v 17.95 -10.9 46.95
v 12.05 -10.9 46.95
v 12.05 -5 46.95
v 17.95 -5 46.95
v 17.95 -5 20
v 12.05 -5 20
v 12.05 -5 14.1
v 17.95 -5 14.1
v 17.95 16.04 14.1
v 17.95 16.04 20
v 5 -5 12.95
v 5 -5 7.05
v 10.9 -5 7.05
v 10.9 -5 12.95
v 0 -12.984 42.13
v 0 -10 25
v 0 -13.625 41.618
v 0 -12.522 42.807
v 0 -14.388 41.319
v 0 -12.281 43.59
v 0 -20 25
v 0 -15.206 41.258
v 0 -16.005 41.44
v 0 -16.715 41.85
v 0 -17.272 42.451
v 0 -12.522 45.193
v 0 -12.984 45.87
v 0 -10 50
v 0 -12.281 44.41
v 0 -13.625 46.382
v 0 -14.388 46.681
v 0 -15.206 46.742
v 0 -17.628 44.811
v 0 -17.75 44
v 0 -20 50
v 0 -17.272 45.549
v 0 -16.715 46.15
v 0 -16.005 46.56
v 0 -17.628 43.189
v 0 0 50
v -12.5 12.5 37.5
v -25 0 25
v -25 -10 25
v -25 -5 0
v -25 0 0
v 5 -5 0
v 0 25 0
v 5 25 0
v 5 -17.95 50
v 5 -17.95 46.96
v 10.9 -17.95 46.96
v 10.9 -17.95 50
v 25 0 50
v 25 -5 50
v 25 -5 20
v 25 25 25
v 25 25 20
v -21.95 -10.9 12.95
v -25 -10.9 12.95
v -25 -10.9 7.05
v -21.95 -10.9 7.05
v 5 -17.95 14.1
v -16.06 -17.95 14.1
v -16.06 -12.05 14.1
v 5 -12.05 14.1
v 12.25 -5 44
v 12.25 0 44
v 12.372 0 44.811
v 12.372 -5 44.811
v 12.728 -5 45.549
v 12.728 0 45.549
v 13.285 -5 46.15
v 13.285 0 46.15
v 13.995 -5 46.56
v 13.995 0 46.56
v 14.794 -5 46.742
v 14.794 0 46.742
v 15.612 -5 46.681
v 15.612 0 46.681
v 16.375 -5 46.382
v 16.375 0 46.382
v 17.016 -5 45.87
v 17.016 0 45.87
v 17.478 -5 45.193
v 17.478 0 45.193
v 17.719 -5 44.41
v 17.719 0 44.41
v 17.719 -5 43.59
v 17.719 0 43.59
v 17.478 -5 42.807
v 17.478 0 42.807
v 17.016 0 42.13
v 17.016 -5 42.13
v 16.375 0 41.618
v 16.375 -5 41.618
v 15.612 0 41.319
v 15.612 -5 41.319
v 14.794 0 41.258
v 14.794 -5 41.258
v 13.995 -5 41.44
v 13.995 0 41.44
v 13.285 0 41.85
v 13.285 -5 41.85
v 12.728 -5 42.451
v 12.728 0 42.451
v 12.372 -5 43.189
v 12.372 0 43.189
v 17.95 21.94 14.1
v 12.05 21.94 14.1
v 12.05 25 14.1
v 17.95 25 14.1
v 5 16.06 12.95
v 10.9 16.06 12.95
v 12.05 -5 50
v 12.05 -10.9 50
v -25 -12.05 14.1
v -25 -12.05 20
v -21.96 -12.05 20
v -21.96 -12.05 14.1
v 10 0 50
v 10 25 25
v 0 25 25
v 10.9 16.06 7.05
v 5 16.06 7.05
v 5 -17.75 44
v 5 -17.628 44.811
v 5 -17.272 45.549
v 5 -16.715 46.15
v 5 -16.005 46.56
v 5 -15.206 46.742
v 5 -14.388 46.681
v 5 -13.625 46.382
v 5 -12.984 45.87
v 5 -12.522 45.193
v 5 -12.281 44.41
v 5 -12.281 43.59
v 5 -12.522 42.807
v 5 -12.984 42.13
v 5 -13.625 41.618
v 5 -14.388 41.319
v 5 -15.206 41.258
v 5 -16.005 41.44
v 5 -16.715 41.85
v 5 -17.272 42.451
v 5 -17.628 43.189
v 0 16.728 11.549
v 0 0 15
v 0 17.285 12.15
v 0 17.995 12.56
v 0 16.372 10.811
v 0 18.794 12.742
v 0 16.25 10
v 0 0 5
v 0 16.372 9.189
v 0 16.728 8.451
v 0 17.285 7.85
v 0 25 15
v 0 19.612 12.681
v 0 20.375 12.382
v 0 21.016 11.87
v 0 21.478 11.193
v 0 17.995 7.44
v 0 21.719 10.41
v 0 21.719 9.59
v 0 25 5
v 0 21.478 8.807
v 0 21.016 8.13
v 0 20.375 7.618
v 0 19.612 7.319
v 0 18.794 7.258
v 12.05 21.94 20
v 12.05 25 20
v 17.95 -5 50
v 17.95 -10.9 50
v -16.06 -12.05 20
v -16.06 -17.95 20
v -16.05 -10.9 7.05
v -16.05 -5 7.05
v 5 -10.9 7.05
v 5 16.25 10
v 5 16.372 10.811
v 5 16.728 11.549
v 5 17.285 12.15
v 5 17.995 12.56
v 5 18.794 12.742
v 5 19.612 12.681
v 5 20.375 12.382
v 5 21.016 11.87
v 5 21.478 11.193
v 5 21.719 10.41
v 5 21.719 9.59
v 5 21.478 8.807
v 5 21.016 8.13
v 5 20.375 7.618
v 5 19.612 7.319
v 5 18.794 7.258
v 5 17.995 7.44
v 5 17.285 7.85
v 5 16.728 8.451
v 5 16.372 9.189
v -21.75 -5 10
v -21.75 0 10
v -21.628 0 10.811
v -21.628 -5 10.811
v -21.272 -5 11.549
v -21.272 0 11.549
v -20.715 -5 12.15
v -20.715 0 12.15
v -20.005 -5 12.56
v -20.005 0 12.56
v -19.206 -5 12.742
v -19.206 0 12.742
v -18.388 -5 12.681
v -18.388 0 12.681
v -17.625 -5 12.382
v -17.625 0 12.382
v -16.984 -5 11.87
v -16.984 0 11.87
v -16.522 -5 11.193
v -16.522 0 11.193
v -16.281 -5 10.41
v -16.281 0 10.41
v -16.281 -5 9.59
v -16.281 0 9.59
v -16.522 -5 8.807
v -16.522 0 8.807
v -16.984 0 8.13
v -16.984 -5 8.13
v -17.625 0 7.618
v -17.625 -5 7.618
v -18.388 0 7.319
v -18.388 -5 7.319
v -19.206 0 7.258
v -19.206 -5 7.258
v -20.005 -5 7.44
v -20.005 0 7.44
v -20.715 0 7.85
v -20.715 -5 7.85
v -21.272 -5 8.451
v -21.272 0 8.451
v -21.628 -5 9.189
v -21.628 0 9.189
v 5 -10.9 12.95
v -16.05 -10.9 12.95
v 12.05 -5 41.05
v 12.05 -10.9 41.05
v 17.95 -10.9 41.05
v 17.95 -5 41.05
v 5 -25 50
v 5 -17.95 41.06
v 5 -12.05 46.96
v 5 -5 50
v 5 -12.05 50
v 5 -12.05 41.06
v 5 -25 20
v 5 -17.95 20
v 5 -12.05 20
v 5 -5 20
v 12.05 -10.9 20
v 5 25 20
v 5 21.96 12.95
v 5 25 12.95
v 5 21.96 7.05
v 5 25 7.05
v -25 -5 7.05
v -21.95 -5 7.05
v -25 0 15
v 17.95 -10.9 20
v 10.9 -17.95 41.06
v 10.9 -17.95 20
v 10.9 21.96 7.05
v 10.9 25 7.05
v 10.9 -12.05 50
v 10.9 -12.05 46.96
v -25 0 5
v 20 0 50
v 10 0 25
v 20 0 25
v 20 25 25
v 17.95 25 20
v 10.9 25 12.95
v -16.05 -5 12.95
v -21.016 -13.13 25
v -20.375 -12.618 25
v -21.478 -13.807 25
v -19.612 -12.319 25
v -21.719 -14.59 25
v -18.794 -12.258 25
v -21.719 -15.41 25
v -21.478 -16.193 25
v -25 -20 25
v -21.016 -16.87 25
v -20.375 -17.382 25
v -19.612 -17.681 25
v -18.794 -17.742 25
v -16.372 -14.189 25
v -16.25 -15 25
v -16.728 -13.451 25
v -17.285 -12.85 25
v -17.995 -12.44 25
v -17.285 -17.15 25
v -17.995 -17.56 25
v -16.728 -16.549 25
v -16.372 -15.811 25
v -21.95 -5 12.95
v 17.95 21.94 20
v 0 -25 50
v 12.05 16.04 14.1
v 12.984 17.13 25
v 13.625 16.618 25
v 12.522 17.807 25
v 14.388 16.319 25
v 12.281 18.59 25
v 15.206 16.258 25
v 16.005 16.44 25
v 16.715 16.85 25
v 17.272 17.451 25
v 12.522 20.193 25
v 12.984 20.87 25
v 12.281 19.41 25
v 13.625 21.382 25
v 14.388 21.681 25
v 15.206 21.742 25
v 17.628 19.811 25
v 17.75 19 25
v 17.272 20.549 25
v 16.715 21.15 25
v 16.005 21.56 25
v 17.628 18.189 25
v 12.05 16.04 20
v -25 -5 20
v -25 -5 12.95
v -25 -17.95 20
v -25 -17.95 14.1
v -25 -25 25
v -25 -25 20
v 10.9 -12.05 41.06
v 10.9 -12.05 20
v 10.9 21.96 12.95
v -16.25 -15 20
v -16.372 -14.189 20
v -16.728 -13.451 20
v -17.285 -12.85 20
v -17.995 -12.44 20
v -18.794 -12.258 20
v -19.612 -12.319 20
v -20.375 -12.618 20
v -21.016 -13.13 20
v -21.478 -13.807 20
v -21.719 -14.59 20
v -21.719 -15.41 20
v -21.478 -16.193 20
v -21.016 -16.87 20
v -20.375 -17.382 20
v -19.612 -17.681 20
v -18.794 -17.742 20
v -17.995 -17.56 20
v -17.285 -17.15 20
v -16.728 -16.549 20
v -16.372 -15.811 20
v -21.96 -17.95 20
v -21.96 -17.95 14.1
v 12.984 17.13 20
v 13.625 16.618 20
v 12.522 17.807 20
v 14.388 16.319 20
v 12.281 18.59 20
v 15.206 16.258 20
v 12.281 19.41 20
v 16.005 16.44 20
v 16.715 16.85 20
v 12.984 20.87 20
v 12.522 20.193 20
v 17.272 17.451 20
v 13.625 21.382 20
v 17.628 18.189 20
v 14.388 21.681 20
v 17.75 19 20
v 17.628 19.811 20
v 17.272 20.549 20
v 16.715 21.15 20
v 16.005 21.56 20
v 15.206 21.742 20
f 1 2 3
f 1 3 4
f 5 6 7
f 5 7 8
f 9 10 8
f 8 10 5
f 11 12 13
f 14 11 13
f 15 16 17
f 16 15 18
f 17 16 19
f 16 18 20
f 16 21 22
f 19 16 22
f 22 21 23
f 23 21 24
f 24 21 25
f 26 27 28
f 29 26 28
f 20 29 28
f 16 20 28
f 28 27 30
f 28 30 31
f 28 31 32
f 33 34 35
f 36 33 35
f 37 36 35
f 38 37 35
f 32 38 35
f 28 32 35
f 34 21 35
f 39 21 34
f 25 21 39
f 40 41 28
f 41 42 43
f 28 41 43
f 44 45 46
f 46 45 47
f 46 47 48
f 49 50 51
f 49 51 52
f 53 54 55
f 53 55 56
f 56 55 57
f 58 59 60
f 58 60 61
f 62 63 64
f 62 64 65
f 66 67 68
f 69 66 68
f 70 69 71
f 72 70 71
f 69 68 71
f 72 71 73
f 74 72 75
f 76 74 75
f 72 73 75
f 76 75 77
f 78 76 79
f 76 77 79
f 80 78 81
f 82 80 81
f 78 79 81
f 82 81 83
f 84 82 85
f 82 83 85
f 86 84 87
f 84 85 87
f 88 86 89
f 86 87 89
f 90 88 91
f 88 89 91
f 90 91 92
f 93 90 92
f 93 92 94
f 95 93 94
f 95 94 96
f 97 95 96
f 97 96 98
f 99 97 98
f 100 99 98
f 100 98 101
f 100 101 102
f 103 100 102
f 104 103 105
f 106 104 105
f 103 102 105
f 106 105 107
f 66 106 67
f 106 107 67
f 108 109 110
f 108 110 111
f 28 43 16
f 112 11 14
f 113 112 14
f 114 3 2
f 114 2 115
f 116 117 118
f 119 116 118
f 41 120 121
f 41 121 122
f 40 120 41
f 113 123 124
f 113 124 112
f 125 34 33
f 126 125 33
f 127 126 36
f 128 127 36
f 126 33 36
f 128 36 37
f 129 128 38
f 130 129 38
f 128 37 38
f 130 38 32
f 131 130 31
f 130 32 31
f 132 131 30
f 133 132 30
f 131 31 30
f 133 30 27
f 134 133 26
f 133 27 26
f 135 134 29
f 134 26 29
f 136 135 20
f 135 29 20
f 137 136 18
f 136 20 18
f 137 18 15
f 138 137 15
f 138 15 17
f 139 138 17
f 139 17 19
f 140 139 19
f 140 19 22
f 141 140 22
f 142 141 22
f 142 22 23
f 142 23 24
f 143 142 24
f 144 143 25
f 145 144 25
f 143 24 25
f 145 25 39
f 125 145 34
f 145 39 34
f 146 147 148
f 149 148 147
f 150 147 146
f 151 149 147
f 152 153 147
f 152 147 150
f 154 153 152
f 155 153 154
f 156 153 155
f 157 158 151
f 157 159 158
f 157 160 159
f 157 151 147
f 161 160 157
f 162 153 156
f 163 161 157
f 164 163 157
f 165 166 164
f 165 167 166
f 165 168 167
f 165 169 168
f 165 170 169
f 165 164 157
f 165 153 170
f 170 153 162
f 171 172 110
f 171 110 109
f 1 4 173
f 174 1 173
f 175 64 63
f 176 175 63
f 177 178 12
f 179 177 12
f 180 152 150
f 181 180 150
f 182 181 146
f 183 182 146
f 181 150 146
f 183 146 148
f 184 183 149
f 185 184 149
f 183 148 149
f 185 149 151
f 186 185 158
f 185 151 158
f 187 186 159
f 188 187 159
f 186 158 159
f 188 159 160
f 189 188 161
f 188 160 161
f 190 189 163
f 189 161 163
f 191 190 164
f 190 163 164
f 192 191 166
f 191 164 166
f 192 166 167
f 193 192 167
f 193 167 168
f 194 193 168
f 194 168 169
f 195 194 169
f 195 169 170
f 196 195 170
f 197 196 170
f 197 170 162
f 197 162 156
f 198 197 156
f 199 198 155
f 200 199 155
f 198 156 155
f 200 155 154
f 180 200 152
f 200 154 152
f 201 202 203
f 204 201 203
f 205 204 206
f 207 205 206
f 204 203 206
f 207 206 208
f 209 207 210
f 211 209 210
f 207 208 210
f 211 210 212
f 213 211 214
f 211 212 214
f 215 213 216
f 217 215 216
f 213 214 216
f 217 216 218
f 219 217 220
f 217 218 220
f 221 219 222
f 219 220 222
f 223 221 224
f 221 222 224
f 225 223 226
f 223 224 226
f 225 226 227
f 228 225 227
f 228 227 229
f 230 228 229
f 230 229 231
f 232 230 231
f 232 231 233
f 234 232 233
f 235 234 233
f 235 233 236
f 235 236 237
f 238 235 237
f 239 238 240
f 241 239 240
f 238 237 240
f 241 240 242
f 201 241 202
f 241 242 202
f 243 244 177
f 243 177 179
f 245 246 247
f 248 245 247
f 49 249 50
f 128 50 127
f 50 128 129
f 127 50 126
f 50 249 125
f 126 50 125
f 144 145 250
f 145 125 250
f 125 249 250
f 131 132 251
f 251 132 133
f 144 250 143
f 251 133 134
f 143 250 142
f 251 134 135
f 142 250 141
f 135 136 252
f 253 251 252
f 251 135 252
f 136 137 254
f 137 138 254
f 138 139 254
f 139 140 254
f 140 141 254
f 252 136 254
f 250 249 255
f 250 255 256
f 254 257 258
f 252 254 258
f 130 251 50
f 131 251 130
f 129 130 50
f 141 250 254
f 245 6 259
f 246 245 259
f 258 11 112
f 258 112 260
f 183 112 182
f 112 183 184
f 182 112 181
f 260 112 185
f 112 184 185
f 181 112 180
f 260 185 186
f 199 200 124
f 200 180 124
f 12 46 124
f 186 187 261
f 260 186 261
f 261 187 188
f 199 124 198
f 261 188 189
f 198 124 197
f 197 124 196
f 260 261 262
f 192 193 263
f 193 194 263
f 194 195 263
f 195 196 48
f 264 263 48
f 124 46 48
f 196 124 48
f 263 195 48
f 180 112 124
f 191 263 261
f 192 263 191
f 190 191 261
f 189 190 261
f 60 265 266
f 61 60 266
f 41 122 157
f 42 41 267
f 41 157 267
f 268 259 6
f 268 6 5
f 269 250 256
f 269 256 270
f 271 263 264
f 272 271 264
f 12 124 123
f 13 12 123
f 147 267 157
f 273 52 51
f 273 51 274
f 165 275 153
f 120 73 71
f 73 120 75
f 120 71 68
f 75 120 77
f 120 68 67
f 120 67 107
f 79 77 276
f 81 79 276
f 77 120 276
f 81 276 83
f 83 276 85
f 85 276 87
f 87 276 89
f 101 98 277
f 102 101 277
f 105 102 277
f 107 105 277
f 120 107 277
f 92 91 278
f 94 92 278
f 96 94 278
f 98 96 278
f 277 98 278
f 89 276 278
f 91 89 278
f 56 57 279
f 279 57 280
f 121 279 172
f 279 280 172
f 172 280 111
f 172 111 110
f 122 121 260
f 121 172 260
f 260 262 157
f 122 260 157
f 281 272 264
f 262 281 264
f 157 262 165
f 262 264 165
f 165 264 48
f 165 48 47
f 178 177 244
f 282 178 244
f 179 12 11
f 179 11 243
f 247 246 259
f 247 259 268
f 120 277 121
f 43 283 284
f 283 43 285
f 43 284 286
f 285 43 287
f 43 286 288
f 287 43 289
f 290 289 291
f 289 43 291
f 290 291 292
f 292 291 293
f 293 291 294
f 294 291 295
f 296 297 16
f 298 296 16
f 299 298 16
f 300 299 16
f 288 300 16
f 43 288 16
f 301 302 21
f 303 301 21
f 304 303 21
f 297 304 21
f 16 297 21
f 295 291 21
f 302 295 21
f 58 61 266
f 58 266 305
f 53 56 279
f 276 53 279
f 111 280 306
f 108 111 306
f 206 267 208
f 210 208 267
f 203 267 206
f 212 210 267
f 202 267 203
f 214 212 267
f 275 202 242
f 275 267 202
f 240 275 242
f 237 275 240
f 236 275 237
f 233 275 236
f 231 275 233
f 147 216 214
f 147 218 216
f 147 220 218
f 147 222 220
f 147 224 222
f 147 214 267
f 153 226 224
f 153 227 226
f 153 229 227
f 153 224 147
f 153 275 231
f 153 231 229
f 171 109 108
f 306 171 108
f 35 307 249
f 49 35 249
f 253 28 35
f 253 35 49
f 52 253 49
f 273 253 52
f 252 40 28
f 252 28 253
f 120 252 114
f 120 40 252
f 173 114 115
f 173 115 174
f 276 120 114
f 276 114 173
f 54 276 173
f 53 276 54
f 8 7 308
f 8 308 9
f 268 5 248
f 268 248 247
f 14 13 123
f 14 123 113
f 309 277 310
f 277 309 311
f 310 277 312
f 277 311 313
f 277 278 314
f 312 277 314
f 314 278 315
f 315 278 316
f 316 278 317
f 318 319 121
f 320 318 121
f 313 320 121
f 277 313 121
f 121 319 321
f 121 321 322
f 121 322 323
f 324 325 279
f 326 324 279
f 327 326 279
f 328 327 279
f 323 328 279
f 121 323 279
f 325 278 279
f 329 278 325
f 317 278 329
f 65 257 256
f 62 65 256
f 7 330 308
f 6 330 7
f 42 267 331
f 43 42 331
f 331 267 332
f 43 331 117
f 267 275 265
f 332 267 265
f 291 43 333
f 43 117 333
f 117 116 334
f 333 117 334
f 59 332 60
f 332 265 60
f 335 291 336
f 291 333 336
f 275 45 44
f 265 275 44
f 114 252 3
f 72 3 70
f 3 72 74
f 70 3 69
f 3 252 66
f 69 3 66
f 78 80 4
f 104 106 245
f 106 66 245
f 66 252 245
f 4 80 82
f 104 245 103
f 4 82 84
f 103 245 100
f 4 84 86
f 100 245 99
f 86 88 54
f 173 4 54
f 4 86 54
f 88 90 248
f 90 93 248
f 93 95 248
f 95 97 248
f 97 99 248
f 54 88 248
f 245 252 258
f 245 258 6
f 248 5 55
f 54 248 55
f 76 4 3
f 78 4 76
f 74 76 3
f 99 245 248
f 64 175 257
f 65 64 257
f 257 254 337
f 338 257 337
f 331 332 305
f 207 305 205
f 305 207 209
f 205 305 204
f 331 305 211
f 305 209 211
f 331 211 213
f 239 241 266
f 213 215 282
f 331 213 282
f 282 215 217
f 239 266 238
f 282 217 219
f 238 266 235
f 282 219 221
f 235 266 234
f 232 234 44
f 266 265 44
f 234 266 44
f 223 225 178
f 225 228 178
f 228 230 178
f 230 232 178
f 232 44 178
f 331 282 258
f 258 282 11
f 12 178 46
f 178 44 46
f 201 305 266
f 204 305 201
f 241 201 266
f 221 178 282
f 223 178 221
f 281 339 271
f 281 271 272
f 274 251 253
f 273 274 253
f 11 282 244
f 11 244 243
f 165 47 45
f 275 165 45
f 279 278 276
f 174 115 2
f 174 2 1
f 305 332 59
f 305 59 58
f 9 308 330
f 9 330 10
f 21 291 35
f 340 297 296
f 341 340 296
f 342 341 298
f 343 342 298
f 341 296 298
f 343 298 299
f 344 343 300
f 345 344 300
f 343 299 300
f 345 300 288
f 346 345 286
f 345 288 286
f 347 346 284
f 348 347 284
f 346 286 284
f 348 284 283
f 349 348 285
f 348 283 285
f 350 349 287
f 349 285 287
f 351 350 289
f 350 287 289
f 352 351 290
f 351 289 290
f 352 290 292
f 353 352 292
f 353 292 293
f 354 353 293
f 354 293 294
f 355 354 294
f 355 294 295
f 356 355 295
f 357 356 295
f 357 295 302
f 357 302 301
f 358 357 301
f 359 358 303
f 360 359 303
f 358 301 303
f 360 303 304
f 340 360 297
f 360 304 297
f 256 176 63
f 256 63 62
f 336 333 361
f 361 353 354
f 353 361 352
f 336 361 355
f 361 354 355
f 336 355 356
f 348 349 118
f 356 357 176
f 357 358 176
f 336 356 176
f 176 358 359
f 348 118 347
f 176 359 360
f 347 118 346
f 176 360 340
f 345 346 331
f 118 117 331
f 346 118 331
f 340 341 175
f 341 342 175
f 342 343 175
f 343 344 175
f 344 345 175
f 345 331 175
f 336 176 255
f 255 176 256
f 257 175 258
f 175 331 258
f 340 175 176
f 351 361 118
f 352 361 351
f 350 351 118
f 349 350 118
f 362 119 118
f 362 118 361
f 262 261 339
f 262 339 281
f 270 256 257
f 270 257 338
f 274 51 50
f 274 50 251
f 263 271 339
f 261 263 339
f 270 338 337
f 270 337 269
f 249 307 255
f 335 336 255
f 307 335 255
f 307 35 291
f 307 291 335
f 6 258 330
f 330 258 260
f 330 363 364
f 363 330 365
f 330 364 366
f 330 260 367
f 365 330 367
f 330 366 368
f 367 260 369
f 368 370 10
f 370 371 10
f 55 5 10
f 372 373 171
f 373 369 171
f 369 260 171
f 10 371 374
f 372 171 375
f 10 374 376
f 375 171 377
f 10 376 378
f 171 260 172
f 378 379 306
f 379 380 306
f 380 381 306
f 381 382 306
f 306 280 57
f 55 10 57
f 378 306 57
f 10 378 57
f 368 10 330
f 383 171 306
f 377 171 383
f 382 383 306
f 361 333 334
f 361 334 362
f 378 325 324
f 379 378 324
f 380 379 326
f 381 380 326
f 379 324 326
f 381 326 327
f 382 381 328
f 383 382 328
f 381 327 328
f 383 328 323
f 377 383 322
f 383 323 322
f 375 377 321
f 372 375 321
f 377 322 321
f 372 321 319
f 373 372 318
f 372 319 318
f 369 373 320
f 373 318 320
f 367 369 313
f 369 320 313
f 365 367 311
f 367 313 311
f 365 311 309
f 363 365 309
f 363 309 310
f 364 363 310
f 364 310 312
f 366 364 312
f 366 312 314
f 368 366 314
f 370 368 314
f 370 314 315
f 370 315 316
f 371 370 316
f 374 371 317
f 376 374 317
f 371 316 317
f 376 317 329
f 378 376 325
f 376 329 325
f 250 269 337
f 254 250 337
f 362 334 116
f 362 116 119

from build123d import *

# Parameters (mm, degrees)
F0_W      = 20
F0_H      = 30
F0_W_2    = 30
F0_H_2    = 20
F1_DEPTH  = 50
F2_DEPTH  = 20
F3_SIZE   = 25
F6_DEPTH  = 10
F9_DEPTH  = 10
F12_DEPTH = 10
F13_R     = 2.75
F14_DEPTH = 5
F15_R     = 2.75
F16_DEPTH = 5
F17_R     = 2.75
F18_DEPTH = 5
F19_R     = 2.75
F20_DEPTH = 5
F21_R     = 2.75
F22_DEPTH = 5
F23_R     = 2.75
F24_DEPTH = 5
F25_W     = 5.9
F25_H     = 21.05
F25_H_2   = 3.05
F26_DEPTH = 5.9
F27_W     = 5.9
F27_H     = 3.04
F27_H_2   = 21.06
F28_DEPTH = 5.9
F29_W     = 26.96
F29_H     = 5.9
F29_W_2   = 3.04
F30_DEPTH = 5.9
F31_W     = 5.9
F31_H     = 26.94
F31_H_2   = 3.06
F32_DEPTH = 5.9
F33_W     = 21.06
F33_H     = 5.9
F33_W_2   = 3.04
F34_DEPTH = 5.9
F35_W     = 26.95
F35_H     = 5.9
F35_W_2   = 3.05
F36_DEPTH = 5.9
F37_W     = 5.9
F37_H     = 5.9
F38_DEPTH = 5.9
F39_W     = 5.9
F39_H     = 5.9
F40_DEPTH = 5.9
F41_W     = 5.9
F41_H     = 5.9
F42_DEPTH = 5.9


with BuildPart() as f1:
    # F0 (on Top) → F1 (new body)
    with BuildSketch(Plane.XY):
        with Locations((15, 10)):
            Rectangle(F0_W, F0_H)
        Polygon((5, -5), (5, 25), (0, 25), (-25, 0), (-25, -5), align=None)
        with Locations((-10, -15)):
            Rectangle(F0_W_2, F0_H_2)
    extrude(amount=F1_DEPTH)

    # F0 (on Top) → F2 (cut)
    with BuildSketch(Plane.XY):
        with Locations((-10, -15)):
            Rectangle(F0_W_2, F0_H_2)
        with Locations((15, 10)):
            Rectangle(F0_W, F0_H)
    extrude(amount=F2_DEPTH, mode=Mode.SUBTRACT)

    # F3 (call 1 of 2: OpenCascade refuses the feature's edges together)
    f3_edges = [f1.edges().sort_by_distance(p)[0] for p in [
        (12.5, 25, 50),
    ]]
    chamfer(f3_edges, length=F3_SIZE)

    # F3#2 (call 2 of 2)
    f3_2_edges = [f1.edges().sort_by_distance(p)[0] for p in [
        (-25, -12.5, 50),
    ]]
    chamfer(f3_2_edges, length=F3_SIZE)

    # F5 (on offset) → F6 (cut)
    with BuildSketch(Plane.YZ.offset(20)):
        Polygon((0, 25), (25, 25), (0, 50), align=None)
    extrude(amount=-F6_DEPTH, mode=Mode.SUBTRACT)

    # F8 (on offset) → F9 (cut)
    with BuildSketch(Plane.XZ.offset(20)):
        Polygon((0, 25), (0, 50), (-25, 25), align=None)
    extrude(amount=-F9_DEPTH, mode=Mode.SUBTRACT)

    # F11 (on offset) → F12 (cut)
    with BuildSketch(Plane.XY.offset(5)):
        Polygon((0, 0), (0, 25), (-25, 0), align=None)
    extrude(amount=F12_DEPTH, mode=Mode.SUBTRACT)

    # F13 (on face) → F14 (cut)
    with BuildSketch(Plane(origin=(0, 0, 0), x_dir=(0, -1, 0), z_dir=(-1, 0, 0))):
        with Locations((15, 44)):
            Circle(F13_R)
    extrude(amount=-F14_DEPTH, mode=Mode.SUBTRACT)

    # F15 (on face) → F16 (cut)
    with BuildSketch(Plane.XY.offset(25)):
        with Locations((-19, -15)):
            Circle(F15_R)
    extrude(amount=-F16_DEPTH, mode=Mode.SUBTRACT)

    # F17 (on face) → F18 (cut)
    with BuildSketch(Plane(origin=(0, 0, 0), x_dir=(-1, 0, 0), z_dir=(0, 1, 0))):
        with Locations((19, 10)):
            Circle(F17_R)
    extrude(amount=-F18_DEPTH, mode=Mode.SUBTRACT)

    # F19 (on face) → F20 (cut)
    with BuildSketch(Plane(origin=(0, 0, 0), x_dir=(0, -1, 0), z_dir=(-1, 0, 0))):
        with Locations((-19, 10)):
            Circle(F19_R)
    extrude(amount=-F20_DEPTH, mode=Mode.SUBTRACT)

    # F21 (on face) → F22 (cut)
    with BuildSketch(Plane.XY.offset(25)):
        with Locations((15, 19)):
            Circle(F21_R)
    extrude(amount=-F22_DEPTH, mode=Mode.SUBTRACT)

    # F23 (on face) → F24 (cut)
    with BuildSketch(Plane(origin=(0, 0, 0), x_dir=(-1, 0, 0), z_dir=(0, 1, 0))):
        with Locations((-15, 44)):
            Circle(F23_R)
    extrude(amount=-F24_DEPTH, mode=Mode.SUBTRACT)

    # F25 (on face) → F26 (join)
    with BuildSketch(Plane.XZ.offset(5)):
        with Locations((15, 30.525)):
            Rectangle(F25_W, F25_H)
        with Locations((15, 48.475)):
            Rectangle(F25_W, F25_H_2)
    extrude(amount=F26_DEPTH)

    # F27 (on face) → F28 (join)
    with BuildSketch(Plane.YZ.offset(5)):
        with Locations((-15, 48.48)):
            Rectangle(F27_W, F27_H)
        with Locations((-15, 30.53)):
            Rectangle(F27_W, F27_H_2)
    extrude(amount=F28_DEPTH)

    # F29 (on face) → F30 (join)
    with BuildSketch(Plane(origin=(0, 0, 20), x_dir=(1, 0, 0), z_dir=(0, 0, -1))):
        with Locations((-2.58, 15)):
            Rectangle(F29_W, F29_H)
        with Locations((-23.48, 15)):
            Rectangle(F29_W_2, F29_H)
    extrude(amount=F30_DEPTH)

    # F31 (on face) → F32 (join)
    with BuildSketch(Plane(origin=(0, 0, 20), x_dir=(1, 0, 0), z_dir=(0, 0, -1))):
        with Locations((15, -2.57)):
            Rectangle(F31_W, F31_H)
        with Locations((15, -23.47)):
            Rectangle(F31_W, F31_H_2)
    extrude(amount=F32_DEPTH)

    # F33 (on face) → F34 (join)
    with BuildSketch(Plane.YZ.offset(5)):
        with Locations((5.53, 10)):
            Rectangle(F33_W, F33_H)
        with Locations((23.48, 10)):
            Rectangle(F33_W_2, F33_H)
    extrude(amount=F34_DEPTH)

    # F35 (on face) → F36 (join)
    with BuildSketch(Plane.XZ.offset(5)):
        with Locations((-2.575, 10)):
            Rectangle(F35_W, F35_H)
        with Locations((-23.475, 10)):
            Rectangle(F35_W_2, F35_H)
    extrude(amount=F36_DEPTH)

    # F37 (on face) → F38 (cut)
    with BuildSketch(Plane(origin=(0, 0, 7.05), x_dir=(1, 0, 0), z_dir=(0, 0, -1))):
        with Locations((7.95, 7.95)):
            Rectangle(F37_W, F37_H)
    extrude(amount=-F38_DEPTH, mode=Mode.SUBTRACT)

    # F39 (on face) → F40 (cut)
    with BuildSketch(Plane(origin=(0, 0, 14.1), x_dir=(1, 0, 0), z_dir=(0, 0, -1))):
        with Locations((7.95, 15)):
            Rectangle(F39_W, F39_H)
    extrude(amount=-F40_DEPTH, mode=Mode.SUBTRACT)

    # F41 (on face) → F42 (cut)
    with BuildSketch(Plane(origin=(0, 0, 14.1), x_dir=(1, 0, 0), z_dir=(0, 0, -1))):
        with Locations((15, 7.95)):
            Rectangle(F41_W, F41_H)
    extrude(amount=-F42_DEPTH, mode=Mode.SUBTRACT)


solid = f1.part
